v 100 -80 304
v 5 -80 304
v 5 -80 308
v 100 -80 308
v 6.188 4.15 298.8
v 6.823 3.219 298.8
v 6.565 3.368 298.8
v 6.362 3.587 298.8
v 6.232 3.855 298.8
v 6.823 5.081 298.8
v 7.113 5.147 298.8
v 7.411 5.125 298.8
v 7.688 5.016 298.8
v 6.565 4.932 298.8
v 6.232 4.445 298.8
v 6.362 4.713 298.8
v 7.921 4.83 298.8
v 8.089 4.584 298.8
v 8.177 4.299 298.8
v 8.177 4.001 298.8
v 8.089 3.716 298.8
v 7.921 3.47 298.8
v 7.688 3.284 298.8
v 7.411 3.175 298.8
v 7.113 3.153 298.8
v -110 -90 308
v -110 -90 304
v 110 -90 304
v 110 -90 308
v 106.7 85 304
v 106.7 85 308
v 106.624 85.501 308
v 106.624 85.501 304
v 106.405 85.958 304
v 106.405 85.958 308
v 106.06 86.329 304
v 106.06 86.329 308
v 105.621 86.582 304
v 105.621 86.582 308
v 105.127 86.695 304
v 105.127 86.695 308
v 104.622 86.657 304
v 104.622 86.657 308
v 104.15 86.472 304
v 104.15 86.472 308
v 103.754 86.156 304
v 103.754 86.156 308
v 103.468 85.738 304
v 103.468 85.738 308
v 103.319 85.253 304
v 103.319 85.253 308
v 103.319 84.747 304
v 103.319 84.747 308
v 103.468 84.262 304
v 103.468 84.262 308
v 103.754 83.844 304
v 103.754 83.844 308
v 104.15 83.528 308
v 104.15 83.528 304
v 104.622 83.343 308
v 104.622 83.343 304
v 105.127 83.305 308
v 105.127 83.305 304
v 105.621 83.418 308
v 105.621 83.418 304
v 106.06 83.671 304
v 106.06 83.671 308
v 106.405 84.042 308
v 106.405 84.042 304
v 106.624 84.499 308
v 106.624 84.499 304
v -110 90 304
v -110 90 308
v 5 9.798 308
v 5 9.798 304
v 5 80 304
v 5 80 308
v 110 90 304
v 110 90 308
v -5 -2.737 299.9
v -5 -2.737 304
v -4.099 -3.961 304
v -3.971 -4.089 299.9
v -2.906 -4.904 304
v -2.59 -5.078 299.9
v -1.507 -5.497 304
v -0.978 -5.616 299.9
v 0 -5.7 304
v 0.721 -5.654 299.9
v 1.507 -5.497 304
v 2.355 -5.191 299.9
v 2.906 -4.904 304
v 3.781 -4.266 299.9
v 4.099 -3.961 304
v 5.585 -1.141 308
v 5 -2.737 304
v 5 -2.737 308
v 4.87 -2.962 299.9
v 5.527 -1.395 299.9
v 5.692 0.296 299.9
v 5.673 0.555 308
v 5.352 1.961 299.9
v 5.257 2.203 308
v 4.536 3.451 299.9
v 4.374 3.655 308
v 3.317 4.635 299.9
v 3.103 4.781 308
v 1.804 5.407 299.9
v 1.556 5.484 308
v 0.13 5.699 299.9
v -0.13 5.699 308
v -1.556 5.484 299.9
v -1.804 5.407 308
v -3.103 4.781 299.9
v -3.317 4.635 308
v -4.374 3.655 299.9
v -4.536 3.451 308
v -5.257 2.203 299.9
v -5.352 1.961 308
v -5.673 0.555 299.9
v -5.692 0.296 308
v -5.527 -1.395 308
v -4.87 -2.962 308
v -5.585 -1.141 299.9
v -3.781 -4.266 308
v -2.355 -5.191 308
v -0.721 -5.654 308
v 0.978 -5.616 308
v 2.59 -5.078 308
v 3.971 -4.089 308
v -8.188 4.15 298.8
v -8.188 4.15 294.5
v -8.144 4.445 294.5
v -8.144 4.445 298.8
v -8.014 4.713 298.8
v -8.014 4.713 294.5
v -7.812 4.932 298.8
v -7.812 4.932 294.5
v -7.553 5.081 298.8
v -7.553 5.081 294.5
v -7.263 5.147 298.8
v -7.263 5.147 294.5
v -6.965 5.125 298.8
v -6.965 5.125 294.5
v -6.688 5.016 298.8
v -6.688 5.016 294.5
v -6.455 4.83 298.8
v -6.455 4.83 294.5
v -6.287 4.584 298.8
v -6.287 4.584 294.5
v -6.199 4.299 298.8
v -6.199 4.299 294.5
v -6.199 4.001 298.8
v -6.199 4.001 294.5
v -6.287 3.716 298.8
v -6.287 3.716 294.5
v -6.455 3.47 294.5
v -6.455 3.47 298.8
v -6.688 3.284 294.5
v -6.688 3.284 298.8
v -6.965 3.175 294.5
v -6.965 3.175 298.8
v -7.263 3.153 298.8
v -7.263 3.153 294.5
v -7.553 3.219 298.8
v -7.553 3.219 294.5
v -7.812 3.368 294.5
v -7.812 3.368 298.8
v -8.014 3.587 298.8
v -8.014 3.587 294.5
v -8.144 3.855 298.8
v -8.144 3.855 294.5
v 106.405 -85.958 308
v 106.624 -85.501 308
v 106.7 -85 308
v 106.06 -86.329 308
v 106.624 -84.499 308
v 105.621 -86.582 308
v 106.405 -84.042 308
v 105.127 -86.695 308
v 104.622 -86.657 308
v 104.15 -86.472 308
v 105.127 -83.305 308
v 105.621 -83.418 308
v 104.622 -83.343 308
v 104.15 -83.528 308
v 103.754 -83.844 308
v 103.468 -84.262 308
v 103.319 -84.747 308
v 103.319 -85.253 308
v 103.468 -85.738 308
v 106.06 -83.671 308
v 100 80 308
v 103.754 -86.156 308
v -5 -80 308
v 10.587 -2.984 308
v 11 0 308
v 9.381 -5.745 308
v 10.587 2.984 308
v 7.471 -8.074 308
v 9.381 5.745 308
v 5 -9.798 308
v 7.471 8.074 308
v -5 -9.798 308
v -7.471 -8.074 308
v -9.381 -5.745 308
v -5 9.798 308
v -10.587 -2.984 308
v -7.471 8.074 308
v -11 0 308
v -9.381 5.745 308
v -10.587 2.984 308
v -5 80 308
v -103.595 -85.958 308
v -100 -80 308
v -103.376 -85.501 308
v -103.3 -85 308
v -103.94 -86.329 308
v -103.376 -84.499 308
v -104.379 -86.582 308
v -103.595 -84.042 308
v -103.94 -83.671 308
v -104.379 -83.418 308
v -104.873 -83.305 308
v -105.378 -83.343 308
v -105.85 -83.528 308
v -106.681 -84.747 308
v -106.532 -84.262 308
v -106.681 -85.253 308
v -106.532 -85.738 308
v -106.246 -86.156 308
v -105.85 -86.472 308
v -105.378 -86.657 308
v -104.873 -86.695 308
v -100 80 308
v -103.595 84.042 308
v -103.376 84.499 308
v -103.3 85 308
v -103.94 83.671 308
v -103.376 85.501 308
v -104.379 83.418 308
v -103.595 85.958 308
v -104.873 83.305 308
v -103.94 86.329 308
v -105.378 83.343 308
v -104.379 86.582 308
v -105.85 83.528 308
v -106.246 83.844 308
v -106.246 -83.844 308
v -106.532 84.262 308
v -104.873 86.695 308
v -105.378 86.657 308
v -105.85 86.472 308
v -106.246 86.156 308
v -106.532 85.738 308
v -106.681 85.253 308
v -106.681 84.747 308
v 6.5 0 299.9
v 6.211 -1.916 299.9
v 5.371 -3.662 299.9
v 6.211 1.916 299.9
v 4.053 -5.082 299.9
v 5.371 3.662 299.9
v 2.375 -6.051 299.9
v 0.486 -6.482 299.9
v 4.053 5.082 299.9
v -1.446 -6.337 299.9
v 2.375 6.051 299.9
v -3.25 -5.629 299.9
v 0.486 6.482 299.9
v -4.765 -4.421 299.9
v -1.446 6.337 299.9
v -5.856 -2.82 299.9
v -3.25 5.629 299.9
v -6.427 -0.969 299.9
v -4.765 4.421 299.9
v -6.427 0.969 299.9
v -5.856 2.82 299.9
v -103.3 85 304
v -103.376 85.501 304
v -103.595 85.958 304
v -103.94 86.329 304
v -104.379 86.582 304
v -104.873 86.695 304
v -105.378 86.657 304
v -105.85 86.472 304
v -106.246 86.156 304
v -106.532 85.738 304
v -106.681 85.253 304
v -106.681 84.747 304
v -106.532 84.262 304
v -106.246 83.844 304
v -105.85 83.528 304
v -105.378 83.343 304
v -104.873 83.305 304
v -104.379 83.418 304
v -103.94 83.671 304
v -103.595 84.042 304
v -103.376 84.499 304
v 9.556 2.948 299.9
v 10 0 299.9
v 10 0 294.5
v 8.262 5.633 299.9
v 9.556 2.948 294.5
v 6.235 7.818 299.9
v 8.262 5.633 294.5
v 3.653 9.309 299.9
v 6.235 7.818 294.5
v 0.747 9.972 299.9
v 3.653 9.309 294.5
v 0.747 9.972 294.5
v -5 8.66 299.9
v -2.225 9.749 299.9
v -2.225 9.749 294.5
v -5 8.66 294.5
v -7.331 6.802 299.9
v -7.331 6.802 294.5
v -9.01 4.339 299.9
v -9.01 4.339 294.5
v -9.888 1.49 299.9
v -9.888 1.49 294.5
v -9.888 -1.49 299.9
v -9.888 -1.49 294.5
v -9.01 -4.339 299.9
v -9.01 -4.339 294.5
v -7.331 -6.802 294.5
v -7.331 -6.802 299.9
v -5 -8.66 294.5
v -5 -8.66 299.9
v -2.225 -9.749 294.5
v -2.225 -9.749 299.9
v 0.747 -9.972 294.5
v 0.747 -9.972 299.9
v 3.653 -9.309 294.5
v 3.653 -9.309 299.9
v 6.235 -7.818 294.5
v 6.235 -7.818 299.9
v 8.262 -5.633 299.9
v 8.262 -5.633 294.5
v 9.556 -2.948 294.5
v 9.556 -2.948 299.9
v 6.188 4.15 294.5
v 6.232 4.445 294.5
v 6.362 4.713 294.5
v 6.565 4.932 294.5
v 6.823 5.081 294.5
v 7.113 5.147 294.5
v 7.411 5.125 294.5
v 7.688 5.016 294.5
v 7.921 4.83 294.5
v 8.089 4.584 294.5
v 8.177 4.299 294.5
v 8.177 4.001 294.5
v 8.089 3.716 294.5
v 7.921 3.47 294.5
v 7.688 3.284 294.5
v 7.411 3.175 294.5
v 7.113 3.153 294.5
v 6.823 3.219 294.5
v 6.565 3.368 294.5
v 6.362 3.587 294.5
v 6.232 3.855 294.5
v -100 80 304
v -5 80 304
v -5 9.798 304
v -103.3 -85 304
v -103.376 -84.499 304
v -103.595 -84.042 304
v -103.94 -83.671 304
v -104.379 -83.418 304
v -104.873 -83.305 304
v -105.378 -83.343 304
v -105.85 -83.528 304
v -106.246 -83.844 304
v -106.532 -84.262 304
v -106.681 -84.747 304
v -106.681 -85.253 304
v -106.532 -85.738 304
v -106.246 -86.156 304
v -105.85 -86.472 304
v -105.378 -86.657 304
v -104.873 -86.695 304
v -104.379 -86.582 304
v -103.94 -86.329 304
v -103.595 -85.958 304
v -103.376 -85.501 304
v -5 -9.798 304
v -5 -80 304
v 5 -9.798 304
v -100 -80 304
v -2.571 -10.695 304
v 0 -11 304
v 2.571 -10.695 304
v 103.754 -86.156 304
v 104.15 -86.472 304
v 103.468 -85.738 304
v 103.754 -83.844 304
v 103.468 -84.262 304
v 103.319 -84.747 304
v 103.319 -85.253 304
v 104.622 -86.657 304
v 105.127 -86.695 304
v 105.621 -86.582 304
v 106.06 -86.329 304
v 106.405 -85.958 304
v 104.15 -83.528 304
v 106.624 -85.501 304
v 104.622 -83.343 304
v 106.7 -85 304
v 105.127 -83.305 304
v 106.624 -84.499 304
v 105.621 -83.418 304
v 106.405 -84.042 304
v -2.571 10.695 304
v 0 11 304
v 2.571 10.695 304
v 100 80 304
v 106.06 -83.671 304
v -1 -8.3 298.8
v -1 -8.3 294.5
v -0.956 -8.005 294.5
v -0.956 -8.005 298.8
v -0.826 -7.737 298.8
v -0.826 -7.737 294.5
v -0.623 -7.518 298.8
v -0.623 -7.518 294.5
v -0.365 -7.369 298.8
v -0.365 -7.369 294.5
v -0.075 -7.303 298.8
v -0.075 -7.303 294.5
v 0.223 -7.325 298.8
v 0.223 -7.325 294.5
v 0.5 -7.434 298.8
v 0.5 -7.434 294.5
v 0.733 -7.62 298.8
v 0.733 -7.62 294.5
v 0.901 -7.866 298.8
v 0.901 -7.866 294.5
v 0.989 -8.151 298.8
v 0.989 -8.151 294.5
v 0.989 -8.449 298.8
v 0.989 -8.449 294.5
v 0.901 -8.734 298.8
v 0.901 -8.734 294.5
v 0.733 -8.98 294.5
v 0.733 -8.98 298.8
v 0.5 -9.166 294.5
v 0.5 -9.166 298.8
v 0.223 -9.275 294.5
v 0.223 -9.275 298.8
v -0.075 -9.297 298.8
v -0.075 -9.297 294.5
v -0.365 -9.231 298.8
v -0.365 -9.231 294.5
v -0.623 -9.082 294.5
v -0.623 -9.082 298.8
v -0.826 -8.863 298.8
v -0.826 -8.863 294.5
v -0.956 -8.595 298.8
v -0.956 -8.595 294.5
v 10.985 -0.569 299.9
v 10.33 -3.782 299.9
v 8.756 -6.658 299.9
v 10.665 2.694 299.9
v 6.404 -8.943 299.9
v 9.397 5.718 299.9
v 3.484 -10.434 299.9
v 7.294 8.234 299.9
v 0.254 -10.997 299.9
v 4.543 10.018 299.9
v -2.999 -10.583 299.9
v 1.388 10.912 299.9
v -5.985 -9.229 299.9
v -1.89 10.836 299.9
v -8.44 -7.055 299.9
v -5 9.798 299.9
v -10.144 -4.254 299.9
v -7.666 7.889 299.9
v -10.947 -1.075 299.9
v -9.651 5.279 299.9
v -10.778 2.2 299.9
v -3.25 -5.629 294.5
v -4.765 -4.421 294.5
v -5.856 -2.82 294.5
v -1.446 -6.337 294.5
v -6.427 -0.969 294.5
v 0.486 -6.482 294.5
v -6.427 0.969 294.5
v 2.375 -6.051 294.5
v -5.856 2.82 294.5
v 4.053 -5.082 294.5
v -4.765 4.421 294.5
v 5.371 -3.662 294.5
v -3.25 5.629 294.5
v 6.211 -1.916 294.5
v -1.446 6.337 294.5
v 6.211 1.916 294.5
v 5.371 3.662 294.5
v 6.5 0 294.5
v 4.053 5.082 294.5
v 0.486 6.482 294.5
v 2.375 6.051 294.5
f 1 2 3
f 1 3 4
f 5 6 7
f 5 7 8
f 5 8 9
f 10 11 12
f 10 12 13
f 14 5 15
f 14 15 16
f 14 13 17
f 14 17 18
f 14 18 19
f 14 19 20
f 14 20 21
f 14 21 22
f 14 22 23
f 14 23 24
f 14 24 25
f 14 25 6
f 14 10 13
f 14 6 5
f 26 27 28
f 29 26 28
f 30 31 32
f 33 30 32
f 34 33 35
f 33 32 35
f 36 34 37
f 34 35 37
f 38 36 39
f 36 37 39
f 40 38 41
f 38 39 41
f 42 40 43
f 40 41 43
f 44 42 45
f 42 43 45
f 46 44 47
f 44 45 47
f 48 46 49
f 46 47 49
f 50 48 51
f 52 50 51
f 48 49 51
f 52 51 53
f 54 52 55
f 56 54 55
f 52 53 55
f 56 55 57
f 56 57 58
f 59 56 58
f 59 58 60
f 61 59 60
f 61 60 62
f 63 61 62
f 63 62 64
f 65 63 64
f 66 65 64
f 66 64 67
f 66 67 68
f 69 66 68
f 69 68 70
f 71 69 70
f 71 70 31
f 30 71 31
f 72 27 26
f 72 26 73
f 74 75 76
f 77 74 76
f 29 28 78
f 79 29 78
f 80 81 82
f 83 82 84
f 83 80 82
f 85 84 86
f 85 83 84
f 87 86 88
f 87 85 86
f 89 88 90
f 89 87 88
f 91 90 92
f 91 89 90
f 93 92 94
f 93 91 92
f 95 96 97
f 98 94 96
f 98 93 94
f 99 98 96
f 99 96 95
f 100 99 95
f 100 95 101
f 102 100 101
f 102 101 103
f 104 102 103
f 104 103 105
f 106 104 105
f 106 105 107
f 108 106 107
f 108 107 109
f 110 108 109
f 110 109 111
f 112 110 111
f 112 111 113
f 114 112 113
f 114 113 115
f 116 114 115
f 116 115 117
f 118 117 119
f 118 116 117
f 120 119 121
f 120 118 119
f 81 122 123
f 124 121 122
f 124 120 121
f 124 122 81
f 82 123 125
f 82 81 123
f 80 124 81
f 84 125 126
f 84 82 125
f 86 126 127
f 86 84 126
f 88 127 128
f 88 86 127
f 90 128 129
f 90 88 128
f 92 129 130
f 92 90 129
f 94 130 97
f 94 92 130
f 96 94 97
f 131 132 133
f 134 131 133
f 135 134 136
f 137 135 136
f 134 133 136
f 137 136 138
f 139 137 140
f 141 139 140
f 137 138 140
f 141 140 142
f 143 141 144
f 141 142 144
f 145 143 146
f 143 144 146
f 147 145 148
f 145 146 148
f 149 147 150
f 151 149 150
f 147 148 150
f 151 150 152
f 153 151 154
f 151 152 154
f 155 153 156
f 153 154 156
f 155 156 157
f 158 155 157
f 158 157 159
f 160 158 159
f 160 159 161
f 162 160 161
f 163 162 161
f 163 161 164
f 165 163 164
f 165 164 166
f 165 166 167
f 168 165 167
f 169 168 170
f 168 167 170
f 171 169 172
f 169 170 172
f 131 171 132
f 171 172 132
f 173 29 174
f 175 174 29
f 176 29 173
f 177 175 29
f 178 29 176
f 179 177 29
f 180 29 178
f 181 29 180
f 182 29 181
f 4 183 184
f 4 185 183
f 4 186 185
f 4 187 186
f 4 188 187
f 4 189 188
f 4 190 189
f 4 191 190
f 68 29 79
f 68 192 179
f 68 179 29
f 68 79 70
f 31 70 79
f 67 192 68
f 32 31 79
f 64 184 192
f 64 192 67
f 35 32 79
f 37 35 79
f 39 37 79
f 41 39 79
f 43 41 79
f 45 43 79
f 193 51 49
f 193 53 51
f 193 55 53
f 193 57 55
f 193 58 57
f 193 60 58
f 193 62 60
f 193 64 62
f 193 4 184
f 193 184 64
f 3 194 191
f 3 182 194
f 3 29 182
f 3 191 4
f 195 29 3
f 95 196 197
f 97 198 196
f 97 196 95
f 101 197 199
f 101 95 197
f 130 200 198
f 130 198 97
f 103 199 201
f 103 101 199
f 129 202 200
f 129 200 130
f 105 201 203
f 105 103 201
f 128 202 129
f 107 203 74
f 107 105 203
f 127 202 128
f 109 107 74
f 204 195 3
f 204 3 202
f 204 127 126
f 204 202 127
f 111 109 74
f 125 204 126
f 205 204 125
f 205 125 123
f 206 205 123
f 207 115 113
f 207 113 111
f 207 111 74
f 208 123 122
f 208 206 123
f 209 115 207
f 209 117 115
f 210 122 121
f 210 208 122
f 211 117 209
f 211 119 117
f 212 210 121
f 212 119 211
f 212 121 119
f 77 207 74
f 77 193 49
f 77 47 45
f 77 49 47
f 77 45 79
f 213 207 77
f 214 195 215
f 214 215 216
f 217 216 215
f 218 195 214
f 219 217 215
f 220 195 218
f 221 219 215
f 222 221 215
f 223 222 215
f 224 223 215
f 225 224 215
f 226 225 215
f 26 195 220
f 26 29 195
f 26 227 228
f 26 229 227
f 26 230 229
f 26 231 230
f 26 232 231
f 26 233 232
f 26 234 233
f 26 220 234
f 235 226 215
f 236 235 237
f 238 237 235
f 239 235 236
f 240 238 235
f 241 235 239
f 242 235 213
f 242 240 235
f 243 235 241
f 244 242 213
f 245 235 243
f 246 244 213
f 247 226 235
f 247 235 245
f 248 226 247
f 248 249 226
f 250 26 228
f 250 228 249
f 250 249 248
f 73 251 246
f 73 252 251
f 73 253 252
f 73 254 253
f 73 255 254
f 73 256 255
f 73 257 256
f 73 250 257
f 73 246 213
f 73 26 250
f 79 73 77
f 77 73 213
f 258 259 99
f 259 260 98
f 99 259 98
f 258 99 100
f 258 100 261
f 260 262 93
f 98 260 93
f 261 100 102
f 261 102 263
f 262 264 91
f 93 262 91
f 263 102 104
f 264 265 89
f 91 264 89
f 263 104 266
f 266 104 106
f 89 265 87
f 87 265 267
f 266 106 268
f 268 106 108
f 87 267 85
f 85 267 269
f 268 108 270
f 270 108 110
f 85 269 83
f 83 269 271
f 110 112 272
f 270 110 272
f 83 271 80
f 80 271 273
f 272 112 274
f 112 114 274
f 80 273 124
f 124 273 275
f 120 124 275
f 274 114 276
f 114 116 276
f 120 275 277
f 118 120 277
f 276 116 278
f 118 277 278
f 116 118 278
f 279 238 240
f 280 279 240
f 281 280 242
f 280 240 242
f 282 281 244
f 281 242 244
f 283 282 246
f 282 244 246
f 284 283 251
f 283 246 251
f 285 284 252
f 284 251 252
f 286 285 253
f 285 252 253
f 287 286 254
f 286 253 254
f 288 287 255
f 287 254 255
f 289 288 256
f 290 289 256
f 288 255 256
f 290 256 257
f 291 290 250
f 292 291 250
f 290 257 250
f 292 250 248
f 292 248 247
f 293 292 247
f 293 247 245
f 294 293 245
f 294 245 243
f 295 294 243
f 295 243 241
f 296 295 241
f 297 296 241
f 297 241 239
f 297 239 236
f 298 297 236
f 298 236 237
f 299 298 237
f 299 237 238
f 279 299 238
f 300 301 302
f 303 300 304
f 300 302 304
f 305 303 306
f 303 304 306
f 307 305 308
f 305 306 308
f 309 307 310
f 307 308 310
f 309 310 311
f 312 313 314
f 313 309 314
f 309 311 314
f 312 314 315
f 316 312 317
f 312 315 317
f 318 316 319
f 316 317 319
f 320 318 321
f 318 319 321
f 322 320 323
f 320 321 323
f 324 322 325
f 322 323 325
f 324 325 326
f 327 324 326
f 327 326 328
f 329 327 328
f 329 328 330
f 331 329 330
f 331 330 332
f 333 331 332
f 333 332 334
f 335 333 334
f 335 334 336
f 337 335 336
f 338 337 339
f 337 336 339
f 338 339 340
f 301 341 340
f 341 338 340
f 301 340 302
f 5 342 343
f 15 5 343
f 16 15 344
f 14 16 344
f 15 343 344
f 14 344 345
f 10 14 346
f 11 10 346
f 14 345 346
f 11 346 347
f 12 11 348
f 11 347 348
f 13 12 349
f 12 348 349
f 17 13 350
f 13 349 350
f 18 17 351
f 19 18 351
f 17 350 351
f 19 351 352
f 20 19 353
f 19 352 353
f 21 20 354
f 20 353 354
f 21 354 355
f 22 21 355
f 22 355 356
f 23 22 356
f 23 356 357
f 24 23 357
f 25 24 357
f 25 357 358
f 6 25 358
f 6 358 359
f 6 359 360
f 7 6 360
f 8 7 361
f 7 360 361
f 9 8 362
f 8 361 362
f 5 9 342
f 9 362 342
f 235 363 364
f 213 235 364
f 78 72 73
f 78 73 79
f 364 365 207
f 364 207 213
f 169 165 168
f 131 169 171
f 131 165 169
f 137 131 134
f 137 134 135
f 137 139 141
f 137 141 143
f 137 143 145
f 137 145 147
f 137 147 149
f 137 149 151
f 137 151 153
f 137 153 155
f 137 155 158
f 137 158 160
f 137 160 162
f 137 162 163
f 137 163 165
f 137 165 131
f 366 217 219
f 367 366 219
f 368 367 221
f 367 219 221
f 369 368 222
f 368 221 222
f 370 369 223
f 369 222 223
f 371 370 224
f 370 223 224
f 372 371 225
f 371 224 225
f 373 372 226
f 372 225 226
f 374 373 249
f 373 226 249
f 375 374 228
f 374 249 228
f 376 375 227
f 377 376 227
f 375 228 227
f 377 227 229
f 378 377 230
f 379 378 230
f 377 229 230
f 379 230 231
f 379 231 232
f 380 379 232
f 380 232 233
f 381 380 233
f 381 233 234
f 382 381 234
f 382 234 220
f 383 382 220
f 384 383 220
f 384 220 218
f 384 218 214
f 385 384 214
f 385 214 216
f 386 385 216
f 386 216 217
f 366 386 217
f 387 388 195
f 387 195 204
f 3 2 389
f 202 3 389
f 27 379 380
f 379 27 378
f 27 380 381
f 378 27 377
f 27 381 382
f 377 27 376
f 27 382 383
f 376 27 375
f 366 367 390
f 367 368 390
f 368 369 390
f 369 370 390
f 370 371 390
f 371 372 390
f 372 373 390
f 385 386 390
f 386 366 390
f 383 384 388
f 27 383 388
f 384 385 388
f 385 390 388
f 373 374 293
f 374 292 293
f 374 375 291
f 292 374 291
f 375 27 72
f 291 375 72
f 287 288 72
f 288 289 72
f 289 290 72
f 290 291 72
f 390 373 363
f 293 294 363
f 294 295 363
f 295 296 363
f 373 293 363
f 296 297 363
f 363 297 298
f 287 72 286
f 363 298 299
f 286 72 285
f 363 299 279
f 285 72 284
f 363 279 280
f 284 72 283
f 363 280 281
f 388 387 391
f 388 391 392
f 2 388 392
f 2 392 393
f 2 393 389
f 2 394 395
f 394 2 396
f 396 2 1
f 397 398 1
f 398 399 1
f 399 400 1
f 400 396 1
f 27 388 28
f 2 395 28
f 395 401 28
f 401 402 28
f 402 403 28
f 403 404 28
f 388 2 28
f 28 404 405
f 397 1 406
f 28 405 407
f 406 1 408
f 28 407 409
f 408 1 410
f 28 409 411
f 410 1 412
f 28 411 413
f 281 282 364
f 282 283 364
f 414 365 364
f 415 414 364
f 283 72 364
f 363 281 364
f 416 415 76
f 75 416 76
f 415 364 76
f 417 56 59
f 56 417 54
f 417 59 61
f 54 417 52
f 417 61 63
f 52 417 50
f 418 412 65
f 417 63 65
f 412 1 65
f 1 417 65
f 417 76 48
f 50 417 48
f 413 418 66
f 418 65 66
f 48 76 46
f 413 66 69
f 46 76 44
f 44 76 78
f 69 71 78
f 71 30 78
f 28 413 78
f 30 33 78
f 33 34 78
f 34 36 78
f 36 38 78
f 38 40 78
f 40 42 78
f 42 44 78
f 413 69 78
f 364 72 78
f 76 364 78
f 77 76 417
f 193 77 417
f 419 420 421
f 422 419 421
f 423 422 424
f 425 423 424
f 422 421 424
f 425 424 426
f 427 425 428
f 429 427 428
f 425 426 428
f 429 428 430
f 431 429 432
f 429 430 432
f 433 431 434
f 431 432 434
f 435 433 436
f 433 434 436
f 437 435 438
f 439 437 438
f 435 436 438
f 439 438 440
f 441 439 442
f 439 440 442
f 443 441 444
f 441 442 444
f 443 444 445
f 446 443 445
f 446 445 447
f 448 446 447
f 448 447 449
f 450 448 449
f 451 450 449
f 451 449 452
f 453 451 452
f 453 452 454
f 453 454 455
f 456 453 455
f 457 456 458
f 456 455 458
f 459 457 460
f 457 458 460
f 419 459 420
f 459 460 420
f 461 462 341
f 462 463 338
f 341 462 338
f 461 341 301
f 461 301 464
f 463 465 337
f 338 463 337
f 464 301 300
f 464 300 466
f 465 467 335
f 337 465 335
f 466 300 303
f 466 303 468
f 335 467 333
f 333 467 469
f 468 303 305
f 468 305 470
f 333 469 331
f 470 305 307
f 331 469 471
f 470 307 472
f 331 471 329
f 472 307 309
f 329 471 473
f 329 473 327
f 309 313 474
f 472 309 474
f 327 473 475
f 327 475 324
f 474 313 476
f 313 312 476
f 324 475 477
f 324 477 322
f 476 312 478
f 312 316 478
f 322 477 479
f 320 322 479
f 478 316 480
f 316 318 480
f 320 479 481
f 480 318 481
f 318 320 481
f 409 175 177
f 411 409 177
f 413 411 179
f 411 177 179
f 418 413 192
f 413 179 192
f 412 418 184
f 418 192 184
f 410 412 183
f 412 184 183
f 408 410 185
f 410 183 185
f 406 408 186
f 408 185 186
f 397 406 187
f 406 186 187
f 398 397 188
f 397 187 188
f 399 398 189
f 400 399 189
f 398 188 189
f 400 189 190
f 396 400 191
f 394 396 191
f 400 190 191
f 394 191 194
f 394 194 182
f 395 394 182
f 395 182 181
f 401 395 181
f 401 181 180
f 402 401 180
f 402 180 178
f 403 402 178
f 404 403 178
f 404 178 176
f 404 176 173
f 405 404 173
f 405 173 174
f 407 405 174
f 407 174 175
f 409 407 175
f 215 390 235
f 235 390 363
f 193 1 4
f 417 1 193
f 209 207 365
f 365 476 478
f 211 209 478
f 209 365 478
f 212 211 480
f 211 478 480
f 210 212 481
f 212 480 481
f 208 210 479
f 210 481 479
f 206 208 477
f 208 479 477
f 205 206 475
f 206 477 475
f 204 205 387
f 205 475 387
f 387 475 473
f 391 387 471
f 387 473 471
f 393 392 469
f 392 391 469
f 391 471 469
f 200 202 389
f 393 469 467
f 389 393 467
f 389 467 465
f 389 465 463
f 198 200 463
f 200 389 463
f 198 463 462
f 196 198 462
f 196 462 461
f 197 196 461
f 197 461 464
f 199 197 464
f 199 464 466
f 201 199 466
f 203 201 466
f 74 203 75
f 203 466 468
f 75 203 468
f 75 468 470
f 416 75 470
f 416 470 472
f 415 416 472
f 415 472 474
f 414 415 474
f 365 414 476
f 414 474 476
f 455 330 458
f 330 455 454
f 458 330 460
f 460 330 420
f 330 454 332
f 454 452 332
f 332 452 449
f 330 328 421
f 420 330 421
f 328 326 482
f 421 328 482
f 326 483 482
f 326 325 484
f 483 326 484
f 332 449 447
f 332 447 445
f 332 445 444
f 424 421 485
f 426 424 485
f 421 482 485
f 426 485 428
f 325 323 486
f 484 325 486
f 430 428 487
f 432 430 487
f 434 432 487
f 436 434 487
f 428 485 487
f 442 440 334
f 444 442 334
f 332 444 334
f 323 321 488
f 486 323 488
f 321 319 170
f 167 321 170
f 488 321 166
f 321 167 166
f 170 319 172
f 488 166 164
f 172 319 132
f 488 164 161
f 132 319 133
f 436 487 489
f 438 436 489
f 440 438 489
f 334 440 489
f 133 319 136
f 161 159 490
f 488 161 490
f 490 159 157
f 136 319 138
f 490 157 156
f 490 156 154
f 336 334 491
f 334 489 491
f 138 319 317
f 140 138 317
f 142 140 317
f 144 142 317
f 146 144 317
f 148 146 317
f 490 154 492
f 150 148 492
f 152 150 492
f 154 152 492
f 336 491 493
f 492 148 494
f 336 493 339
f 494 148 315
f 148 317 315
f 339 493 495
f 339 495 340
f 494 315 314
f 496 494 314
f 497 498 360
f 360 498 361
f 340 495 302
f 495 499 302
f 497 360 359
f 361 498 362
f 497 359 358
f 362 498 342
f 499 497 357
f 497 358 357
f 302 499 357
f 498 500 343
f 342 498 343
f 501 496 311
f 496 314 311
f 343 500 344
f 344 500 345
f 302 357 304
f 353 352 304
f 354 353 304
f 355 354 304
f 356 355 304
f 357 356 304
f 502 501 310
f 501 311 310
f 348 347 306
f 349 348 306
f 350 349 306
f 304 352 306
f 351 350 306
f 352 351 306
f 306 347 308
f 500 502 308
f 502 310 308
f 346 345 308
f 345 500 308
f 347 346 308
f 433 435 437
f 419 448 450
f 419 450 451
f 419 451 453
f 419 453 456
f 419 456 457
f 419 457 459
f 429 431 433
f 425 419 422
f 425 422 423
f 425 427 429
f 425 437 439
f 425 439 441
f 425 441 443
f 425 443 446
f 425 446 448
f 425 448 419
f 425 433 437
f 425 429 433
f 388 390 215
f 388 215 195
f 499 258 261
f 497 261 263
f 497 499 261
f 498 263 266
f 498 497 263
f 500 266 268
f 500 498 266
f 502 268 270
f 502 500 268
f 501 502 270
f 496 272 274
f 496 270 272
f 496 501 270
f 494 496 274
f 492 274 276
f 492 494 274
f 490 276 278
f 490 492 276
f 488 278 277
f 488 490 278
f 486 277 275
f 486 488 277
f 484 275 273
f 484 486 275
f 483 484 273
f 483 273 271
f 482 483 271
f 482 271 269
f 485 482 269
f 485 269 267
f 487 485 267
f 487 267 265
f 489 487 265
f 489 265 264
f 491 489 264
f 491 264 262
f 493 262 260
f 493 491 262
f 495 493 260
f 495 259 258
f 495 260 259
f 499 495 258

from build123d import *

# Parameters (mm, degrees)
UPPER_PERIMETER_START                         = 304
SKETCH1_W                                     = 220
SKETCH1_H                                     = 180
SKETCH1_W_2                                   = 200
SKETCH1_H_2                                   = 160
UPPER_PERIMETER_DEPTH                         = 4
BEARING_SPINE_START                           = 304
SKETCH2_W                                     = 10
SKETCH2_H                                     = 170
BEARING_SPINE_DEPTH                           = 4
UPPER_OUTER_RACE_STOP_START                   = 299.9
SKETCH3_R                                     = 11
SKETCH3_R_2                                   = 5.7
UPPER_OUTER_RACE_STOP_DEPTH                   = 8.1
FLOATING_OUTER_RACE_SEAT_START                = 294.5
SKETCH4_R                                     = 10
SKETCH4_R_2                                   = 6.5
FLOATING_OUTER_RACE_SEAT_DEPTH                = 5.41
SHAFT_CLIP_CLEARANCE_START                    = -8.11
SKETCH5_R                                     = 5.7
SHAFT_CLIP_CLEARANCE_DEPTH                    = 8.11
SKETCH6_R                                     = 1.7
FOUR_TIE_ROD_CLEARANCE_DEPTH                  = 4.01
SKETCH7_R                                     = 1
THREE_M2_TOP_CAP_THREAD_MAJOR_ENVELOPES_DEPTH = 4.3


with BuildPart() as part:
    # Sketch1 → Upper_Perimeter (new body)
    with BuildSketch(Plane.XY.offset(UPPER_PERIMETER_START)):
        Rectangle(SKETCH1_W, SKETCH1_H)
        Rectangle(SKETCH1_W_2, SKETCH1_H_2, mode=Mode.SUBTRACT)
    extrude(amount=UPPER_PERIMETER_DEPTH)

    # Sketch2 → Bearing_Spine (add)
    with BuildSketch(Plane.XY.offset(BEARING_SPINE_START)):
        Rectangle(SKETCH2_W, SKETCH2_H)
    extrude(amount=BEARING_SPINE_DEPTH)

    # Sketch3 → Upper_Outer_Race_Stop (add)
    with BuildSketch(Plane.XY.offset(UPPER_OUTER_RACE_STOP_START)):
        with Locations(Location((0, 0, 0), (0, 0, 117.035691789))):
            Circle(SKETCH3_R)
        with Locations(Location((0, 0, 0), (0, 0, 208.694413527))):
            Circle(SKETCH3_R_2, mode=Mode.SUBTRACT)
    extrude(amount=UPPER_OUTER_RACE_STOP_DEPTH)

    # Sketch4 → Floating_Outer_Race_Seat (add)
    with BuildSketch(Plane.XY.offset(FLOATING_OUTER_RACE_SEAT_START)):
        Circle(SKETCH4_R)
        Circle(SKETCH4_R_2, mode=Mode.SUBTRACT)
    extrude(amount=FLOATING_OUTER_RACE_SEAT_DEPTH)

    # Sketch5 → Shaft_Clip_Clearance (cut)
    with BuildSketch(Plane.XY.offset(308).offset(SHAFT_CLIP_CLEARANCE_START)):
        Circle(SKETCH5_R)
    extrude(amount=SHAFT_CLIP_CLEARANCE_DEPTH, mode=Mode.SUBTRACT)

    # Sketch6 → Four_Tie_Rod_Clearance (cut)
    with BuildSketch(Plane.XY.offset(308)):
        with Locations((-105, -85)):
            Circle(SKETCH6_R)
        with Locations((-105, 85)):
            Circle(SKETCH6_R)
        with Locations((105, -85)):
            Circle(SKETCH6_R)
        with Locations((105, 85)):
            Circle(SKETCH6_R)
    extrude(amount=-FOUR_TIE_ROD_CLEARANCE_DEPTH, mode=Mode.SUBTRACT)

    # Sketch7 → Three_M2_Top_Cap_Thread_Major_Envelopes (cut)
    with BuildSketch(Plane(origin=(0, 0, 294.5), x_dir=(-1, 0, 0), z_dir=(0, 0, -1))):
        with Locations((-7.188010851, 4.15)):
            Circle(SKETCH7_R)
        with Locations((7.188010851, 4.15)):
            Circle(SKETCH7_R)
        with Locations((0, -8.3)):
            Circle(SKETCH7_R)
    extrude(amount=-THREE_M2_TOP_CAP_THREAD_MAJOR_ENVELOPES_DEPTH, mode=Mode.SUBTRACT)


solid = part.part
